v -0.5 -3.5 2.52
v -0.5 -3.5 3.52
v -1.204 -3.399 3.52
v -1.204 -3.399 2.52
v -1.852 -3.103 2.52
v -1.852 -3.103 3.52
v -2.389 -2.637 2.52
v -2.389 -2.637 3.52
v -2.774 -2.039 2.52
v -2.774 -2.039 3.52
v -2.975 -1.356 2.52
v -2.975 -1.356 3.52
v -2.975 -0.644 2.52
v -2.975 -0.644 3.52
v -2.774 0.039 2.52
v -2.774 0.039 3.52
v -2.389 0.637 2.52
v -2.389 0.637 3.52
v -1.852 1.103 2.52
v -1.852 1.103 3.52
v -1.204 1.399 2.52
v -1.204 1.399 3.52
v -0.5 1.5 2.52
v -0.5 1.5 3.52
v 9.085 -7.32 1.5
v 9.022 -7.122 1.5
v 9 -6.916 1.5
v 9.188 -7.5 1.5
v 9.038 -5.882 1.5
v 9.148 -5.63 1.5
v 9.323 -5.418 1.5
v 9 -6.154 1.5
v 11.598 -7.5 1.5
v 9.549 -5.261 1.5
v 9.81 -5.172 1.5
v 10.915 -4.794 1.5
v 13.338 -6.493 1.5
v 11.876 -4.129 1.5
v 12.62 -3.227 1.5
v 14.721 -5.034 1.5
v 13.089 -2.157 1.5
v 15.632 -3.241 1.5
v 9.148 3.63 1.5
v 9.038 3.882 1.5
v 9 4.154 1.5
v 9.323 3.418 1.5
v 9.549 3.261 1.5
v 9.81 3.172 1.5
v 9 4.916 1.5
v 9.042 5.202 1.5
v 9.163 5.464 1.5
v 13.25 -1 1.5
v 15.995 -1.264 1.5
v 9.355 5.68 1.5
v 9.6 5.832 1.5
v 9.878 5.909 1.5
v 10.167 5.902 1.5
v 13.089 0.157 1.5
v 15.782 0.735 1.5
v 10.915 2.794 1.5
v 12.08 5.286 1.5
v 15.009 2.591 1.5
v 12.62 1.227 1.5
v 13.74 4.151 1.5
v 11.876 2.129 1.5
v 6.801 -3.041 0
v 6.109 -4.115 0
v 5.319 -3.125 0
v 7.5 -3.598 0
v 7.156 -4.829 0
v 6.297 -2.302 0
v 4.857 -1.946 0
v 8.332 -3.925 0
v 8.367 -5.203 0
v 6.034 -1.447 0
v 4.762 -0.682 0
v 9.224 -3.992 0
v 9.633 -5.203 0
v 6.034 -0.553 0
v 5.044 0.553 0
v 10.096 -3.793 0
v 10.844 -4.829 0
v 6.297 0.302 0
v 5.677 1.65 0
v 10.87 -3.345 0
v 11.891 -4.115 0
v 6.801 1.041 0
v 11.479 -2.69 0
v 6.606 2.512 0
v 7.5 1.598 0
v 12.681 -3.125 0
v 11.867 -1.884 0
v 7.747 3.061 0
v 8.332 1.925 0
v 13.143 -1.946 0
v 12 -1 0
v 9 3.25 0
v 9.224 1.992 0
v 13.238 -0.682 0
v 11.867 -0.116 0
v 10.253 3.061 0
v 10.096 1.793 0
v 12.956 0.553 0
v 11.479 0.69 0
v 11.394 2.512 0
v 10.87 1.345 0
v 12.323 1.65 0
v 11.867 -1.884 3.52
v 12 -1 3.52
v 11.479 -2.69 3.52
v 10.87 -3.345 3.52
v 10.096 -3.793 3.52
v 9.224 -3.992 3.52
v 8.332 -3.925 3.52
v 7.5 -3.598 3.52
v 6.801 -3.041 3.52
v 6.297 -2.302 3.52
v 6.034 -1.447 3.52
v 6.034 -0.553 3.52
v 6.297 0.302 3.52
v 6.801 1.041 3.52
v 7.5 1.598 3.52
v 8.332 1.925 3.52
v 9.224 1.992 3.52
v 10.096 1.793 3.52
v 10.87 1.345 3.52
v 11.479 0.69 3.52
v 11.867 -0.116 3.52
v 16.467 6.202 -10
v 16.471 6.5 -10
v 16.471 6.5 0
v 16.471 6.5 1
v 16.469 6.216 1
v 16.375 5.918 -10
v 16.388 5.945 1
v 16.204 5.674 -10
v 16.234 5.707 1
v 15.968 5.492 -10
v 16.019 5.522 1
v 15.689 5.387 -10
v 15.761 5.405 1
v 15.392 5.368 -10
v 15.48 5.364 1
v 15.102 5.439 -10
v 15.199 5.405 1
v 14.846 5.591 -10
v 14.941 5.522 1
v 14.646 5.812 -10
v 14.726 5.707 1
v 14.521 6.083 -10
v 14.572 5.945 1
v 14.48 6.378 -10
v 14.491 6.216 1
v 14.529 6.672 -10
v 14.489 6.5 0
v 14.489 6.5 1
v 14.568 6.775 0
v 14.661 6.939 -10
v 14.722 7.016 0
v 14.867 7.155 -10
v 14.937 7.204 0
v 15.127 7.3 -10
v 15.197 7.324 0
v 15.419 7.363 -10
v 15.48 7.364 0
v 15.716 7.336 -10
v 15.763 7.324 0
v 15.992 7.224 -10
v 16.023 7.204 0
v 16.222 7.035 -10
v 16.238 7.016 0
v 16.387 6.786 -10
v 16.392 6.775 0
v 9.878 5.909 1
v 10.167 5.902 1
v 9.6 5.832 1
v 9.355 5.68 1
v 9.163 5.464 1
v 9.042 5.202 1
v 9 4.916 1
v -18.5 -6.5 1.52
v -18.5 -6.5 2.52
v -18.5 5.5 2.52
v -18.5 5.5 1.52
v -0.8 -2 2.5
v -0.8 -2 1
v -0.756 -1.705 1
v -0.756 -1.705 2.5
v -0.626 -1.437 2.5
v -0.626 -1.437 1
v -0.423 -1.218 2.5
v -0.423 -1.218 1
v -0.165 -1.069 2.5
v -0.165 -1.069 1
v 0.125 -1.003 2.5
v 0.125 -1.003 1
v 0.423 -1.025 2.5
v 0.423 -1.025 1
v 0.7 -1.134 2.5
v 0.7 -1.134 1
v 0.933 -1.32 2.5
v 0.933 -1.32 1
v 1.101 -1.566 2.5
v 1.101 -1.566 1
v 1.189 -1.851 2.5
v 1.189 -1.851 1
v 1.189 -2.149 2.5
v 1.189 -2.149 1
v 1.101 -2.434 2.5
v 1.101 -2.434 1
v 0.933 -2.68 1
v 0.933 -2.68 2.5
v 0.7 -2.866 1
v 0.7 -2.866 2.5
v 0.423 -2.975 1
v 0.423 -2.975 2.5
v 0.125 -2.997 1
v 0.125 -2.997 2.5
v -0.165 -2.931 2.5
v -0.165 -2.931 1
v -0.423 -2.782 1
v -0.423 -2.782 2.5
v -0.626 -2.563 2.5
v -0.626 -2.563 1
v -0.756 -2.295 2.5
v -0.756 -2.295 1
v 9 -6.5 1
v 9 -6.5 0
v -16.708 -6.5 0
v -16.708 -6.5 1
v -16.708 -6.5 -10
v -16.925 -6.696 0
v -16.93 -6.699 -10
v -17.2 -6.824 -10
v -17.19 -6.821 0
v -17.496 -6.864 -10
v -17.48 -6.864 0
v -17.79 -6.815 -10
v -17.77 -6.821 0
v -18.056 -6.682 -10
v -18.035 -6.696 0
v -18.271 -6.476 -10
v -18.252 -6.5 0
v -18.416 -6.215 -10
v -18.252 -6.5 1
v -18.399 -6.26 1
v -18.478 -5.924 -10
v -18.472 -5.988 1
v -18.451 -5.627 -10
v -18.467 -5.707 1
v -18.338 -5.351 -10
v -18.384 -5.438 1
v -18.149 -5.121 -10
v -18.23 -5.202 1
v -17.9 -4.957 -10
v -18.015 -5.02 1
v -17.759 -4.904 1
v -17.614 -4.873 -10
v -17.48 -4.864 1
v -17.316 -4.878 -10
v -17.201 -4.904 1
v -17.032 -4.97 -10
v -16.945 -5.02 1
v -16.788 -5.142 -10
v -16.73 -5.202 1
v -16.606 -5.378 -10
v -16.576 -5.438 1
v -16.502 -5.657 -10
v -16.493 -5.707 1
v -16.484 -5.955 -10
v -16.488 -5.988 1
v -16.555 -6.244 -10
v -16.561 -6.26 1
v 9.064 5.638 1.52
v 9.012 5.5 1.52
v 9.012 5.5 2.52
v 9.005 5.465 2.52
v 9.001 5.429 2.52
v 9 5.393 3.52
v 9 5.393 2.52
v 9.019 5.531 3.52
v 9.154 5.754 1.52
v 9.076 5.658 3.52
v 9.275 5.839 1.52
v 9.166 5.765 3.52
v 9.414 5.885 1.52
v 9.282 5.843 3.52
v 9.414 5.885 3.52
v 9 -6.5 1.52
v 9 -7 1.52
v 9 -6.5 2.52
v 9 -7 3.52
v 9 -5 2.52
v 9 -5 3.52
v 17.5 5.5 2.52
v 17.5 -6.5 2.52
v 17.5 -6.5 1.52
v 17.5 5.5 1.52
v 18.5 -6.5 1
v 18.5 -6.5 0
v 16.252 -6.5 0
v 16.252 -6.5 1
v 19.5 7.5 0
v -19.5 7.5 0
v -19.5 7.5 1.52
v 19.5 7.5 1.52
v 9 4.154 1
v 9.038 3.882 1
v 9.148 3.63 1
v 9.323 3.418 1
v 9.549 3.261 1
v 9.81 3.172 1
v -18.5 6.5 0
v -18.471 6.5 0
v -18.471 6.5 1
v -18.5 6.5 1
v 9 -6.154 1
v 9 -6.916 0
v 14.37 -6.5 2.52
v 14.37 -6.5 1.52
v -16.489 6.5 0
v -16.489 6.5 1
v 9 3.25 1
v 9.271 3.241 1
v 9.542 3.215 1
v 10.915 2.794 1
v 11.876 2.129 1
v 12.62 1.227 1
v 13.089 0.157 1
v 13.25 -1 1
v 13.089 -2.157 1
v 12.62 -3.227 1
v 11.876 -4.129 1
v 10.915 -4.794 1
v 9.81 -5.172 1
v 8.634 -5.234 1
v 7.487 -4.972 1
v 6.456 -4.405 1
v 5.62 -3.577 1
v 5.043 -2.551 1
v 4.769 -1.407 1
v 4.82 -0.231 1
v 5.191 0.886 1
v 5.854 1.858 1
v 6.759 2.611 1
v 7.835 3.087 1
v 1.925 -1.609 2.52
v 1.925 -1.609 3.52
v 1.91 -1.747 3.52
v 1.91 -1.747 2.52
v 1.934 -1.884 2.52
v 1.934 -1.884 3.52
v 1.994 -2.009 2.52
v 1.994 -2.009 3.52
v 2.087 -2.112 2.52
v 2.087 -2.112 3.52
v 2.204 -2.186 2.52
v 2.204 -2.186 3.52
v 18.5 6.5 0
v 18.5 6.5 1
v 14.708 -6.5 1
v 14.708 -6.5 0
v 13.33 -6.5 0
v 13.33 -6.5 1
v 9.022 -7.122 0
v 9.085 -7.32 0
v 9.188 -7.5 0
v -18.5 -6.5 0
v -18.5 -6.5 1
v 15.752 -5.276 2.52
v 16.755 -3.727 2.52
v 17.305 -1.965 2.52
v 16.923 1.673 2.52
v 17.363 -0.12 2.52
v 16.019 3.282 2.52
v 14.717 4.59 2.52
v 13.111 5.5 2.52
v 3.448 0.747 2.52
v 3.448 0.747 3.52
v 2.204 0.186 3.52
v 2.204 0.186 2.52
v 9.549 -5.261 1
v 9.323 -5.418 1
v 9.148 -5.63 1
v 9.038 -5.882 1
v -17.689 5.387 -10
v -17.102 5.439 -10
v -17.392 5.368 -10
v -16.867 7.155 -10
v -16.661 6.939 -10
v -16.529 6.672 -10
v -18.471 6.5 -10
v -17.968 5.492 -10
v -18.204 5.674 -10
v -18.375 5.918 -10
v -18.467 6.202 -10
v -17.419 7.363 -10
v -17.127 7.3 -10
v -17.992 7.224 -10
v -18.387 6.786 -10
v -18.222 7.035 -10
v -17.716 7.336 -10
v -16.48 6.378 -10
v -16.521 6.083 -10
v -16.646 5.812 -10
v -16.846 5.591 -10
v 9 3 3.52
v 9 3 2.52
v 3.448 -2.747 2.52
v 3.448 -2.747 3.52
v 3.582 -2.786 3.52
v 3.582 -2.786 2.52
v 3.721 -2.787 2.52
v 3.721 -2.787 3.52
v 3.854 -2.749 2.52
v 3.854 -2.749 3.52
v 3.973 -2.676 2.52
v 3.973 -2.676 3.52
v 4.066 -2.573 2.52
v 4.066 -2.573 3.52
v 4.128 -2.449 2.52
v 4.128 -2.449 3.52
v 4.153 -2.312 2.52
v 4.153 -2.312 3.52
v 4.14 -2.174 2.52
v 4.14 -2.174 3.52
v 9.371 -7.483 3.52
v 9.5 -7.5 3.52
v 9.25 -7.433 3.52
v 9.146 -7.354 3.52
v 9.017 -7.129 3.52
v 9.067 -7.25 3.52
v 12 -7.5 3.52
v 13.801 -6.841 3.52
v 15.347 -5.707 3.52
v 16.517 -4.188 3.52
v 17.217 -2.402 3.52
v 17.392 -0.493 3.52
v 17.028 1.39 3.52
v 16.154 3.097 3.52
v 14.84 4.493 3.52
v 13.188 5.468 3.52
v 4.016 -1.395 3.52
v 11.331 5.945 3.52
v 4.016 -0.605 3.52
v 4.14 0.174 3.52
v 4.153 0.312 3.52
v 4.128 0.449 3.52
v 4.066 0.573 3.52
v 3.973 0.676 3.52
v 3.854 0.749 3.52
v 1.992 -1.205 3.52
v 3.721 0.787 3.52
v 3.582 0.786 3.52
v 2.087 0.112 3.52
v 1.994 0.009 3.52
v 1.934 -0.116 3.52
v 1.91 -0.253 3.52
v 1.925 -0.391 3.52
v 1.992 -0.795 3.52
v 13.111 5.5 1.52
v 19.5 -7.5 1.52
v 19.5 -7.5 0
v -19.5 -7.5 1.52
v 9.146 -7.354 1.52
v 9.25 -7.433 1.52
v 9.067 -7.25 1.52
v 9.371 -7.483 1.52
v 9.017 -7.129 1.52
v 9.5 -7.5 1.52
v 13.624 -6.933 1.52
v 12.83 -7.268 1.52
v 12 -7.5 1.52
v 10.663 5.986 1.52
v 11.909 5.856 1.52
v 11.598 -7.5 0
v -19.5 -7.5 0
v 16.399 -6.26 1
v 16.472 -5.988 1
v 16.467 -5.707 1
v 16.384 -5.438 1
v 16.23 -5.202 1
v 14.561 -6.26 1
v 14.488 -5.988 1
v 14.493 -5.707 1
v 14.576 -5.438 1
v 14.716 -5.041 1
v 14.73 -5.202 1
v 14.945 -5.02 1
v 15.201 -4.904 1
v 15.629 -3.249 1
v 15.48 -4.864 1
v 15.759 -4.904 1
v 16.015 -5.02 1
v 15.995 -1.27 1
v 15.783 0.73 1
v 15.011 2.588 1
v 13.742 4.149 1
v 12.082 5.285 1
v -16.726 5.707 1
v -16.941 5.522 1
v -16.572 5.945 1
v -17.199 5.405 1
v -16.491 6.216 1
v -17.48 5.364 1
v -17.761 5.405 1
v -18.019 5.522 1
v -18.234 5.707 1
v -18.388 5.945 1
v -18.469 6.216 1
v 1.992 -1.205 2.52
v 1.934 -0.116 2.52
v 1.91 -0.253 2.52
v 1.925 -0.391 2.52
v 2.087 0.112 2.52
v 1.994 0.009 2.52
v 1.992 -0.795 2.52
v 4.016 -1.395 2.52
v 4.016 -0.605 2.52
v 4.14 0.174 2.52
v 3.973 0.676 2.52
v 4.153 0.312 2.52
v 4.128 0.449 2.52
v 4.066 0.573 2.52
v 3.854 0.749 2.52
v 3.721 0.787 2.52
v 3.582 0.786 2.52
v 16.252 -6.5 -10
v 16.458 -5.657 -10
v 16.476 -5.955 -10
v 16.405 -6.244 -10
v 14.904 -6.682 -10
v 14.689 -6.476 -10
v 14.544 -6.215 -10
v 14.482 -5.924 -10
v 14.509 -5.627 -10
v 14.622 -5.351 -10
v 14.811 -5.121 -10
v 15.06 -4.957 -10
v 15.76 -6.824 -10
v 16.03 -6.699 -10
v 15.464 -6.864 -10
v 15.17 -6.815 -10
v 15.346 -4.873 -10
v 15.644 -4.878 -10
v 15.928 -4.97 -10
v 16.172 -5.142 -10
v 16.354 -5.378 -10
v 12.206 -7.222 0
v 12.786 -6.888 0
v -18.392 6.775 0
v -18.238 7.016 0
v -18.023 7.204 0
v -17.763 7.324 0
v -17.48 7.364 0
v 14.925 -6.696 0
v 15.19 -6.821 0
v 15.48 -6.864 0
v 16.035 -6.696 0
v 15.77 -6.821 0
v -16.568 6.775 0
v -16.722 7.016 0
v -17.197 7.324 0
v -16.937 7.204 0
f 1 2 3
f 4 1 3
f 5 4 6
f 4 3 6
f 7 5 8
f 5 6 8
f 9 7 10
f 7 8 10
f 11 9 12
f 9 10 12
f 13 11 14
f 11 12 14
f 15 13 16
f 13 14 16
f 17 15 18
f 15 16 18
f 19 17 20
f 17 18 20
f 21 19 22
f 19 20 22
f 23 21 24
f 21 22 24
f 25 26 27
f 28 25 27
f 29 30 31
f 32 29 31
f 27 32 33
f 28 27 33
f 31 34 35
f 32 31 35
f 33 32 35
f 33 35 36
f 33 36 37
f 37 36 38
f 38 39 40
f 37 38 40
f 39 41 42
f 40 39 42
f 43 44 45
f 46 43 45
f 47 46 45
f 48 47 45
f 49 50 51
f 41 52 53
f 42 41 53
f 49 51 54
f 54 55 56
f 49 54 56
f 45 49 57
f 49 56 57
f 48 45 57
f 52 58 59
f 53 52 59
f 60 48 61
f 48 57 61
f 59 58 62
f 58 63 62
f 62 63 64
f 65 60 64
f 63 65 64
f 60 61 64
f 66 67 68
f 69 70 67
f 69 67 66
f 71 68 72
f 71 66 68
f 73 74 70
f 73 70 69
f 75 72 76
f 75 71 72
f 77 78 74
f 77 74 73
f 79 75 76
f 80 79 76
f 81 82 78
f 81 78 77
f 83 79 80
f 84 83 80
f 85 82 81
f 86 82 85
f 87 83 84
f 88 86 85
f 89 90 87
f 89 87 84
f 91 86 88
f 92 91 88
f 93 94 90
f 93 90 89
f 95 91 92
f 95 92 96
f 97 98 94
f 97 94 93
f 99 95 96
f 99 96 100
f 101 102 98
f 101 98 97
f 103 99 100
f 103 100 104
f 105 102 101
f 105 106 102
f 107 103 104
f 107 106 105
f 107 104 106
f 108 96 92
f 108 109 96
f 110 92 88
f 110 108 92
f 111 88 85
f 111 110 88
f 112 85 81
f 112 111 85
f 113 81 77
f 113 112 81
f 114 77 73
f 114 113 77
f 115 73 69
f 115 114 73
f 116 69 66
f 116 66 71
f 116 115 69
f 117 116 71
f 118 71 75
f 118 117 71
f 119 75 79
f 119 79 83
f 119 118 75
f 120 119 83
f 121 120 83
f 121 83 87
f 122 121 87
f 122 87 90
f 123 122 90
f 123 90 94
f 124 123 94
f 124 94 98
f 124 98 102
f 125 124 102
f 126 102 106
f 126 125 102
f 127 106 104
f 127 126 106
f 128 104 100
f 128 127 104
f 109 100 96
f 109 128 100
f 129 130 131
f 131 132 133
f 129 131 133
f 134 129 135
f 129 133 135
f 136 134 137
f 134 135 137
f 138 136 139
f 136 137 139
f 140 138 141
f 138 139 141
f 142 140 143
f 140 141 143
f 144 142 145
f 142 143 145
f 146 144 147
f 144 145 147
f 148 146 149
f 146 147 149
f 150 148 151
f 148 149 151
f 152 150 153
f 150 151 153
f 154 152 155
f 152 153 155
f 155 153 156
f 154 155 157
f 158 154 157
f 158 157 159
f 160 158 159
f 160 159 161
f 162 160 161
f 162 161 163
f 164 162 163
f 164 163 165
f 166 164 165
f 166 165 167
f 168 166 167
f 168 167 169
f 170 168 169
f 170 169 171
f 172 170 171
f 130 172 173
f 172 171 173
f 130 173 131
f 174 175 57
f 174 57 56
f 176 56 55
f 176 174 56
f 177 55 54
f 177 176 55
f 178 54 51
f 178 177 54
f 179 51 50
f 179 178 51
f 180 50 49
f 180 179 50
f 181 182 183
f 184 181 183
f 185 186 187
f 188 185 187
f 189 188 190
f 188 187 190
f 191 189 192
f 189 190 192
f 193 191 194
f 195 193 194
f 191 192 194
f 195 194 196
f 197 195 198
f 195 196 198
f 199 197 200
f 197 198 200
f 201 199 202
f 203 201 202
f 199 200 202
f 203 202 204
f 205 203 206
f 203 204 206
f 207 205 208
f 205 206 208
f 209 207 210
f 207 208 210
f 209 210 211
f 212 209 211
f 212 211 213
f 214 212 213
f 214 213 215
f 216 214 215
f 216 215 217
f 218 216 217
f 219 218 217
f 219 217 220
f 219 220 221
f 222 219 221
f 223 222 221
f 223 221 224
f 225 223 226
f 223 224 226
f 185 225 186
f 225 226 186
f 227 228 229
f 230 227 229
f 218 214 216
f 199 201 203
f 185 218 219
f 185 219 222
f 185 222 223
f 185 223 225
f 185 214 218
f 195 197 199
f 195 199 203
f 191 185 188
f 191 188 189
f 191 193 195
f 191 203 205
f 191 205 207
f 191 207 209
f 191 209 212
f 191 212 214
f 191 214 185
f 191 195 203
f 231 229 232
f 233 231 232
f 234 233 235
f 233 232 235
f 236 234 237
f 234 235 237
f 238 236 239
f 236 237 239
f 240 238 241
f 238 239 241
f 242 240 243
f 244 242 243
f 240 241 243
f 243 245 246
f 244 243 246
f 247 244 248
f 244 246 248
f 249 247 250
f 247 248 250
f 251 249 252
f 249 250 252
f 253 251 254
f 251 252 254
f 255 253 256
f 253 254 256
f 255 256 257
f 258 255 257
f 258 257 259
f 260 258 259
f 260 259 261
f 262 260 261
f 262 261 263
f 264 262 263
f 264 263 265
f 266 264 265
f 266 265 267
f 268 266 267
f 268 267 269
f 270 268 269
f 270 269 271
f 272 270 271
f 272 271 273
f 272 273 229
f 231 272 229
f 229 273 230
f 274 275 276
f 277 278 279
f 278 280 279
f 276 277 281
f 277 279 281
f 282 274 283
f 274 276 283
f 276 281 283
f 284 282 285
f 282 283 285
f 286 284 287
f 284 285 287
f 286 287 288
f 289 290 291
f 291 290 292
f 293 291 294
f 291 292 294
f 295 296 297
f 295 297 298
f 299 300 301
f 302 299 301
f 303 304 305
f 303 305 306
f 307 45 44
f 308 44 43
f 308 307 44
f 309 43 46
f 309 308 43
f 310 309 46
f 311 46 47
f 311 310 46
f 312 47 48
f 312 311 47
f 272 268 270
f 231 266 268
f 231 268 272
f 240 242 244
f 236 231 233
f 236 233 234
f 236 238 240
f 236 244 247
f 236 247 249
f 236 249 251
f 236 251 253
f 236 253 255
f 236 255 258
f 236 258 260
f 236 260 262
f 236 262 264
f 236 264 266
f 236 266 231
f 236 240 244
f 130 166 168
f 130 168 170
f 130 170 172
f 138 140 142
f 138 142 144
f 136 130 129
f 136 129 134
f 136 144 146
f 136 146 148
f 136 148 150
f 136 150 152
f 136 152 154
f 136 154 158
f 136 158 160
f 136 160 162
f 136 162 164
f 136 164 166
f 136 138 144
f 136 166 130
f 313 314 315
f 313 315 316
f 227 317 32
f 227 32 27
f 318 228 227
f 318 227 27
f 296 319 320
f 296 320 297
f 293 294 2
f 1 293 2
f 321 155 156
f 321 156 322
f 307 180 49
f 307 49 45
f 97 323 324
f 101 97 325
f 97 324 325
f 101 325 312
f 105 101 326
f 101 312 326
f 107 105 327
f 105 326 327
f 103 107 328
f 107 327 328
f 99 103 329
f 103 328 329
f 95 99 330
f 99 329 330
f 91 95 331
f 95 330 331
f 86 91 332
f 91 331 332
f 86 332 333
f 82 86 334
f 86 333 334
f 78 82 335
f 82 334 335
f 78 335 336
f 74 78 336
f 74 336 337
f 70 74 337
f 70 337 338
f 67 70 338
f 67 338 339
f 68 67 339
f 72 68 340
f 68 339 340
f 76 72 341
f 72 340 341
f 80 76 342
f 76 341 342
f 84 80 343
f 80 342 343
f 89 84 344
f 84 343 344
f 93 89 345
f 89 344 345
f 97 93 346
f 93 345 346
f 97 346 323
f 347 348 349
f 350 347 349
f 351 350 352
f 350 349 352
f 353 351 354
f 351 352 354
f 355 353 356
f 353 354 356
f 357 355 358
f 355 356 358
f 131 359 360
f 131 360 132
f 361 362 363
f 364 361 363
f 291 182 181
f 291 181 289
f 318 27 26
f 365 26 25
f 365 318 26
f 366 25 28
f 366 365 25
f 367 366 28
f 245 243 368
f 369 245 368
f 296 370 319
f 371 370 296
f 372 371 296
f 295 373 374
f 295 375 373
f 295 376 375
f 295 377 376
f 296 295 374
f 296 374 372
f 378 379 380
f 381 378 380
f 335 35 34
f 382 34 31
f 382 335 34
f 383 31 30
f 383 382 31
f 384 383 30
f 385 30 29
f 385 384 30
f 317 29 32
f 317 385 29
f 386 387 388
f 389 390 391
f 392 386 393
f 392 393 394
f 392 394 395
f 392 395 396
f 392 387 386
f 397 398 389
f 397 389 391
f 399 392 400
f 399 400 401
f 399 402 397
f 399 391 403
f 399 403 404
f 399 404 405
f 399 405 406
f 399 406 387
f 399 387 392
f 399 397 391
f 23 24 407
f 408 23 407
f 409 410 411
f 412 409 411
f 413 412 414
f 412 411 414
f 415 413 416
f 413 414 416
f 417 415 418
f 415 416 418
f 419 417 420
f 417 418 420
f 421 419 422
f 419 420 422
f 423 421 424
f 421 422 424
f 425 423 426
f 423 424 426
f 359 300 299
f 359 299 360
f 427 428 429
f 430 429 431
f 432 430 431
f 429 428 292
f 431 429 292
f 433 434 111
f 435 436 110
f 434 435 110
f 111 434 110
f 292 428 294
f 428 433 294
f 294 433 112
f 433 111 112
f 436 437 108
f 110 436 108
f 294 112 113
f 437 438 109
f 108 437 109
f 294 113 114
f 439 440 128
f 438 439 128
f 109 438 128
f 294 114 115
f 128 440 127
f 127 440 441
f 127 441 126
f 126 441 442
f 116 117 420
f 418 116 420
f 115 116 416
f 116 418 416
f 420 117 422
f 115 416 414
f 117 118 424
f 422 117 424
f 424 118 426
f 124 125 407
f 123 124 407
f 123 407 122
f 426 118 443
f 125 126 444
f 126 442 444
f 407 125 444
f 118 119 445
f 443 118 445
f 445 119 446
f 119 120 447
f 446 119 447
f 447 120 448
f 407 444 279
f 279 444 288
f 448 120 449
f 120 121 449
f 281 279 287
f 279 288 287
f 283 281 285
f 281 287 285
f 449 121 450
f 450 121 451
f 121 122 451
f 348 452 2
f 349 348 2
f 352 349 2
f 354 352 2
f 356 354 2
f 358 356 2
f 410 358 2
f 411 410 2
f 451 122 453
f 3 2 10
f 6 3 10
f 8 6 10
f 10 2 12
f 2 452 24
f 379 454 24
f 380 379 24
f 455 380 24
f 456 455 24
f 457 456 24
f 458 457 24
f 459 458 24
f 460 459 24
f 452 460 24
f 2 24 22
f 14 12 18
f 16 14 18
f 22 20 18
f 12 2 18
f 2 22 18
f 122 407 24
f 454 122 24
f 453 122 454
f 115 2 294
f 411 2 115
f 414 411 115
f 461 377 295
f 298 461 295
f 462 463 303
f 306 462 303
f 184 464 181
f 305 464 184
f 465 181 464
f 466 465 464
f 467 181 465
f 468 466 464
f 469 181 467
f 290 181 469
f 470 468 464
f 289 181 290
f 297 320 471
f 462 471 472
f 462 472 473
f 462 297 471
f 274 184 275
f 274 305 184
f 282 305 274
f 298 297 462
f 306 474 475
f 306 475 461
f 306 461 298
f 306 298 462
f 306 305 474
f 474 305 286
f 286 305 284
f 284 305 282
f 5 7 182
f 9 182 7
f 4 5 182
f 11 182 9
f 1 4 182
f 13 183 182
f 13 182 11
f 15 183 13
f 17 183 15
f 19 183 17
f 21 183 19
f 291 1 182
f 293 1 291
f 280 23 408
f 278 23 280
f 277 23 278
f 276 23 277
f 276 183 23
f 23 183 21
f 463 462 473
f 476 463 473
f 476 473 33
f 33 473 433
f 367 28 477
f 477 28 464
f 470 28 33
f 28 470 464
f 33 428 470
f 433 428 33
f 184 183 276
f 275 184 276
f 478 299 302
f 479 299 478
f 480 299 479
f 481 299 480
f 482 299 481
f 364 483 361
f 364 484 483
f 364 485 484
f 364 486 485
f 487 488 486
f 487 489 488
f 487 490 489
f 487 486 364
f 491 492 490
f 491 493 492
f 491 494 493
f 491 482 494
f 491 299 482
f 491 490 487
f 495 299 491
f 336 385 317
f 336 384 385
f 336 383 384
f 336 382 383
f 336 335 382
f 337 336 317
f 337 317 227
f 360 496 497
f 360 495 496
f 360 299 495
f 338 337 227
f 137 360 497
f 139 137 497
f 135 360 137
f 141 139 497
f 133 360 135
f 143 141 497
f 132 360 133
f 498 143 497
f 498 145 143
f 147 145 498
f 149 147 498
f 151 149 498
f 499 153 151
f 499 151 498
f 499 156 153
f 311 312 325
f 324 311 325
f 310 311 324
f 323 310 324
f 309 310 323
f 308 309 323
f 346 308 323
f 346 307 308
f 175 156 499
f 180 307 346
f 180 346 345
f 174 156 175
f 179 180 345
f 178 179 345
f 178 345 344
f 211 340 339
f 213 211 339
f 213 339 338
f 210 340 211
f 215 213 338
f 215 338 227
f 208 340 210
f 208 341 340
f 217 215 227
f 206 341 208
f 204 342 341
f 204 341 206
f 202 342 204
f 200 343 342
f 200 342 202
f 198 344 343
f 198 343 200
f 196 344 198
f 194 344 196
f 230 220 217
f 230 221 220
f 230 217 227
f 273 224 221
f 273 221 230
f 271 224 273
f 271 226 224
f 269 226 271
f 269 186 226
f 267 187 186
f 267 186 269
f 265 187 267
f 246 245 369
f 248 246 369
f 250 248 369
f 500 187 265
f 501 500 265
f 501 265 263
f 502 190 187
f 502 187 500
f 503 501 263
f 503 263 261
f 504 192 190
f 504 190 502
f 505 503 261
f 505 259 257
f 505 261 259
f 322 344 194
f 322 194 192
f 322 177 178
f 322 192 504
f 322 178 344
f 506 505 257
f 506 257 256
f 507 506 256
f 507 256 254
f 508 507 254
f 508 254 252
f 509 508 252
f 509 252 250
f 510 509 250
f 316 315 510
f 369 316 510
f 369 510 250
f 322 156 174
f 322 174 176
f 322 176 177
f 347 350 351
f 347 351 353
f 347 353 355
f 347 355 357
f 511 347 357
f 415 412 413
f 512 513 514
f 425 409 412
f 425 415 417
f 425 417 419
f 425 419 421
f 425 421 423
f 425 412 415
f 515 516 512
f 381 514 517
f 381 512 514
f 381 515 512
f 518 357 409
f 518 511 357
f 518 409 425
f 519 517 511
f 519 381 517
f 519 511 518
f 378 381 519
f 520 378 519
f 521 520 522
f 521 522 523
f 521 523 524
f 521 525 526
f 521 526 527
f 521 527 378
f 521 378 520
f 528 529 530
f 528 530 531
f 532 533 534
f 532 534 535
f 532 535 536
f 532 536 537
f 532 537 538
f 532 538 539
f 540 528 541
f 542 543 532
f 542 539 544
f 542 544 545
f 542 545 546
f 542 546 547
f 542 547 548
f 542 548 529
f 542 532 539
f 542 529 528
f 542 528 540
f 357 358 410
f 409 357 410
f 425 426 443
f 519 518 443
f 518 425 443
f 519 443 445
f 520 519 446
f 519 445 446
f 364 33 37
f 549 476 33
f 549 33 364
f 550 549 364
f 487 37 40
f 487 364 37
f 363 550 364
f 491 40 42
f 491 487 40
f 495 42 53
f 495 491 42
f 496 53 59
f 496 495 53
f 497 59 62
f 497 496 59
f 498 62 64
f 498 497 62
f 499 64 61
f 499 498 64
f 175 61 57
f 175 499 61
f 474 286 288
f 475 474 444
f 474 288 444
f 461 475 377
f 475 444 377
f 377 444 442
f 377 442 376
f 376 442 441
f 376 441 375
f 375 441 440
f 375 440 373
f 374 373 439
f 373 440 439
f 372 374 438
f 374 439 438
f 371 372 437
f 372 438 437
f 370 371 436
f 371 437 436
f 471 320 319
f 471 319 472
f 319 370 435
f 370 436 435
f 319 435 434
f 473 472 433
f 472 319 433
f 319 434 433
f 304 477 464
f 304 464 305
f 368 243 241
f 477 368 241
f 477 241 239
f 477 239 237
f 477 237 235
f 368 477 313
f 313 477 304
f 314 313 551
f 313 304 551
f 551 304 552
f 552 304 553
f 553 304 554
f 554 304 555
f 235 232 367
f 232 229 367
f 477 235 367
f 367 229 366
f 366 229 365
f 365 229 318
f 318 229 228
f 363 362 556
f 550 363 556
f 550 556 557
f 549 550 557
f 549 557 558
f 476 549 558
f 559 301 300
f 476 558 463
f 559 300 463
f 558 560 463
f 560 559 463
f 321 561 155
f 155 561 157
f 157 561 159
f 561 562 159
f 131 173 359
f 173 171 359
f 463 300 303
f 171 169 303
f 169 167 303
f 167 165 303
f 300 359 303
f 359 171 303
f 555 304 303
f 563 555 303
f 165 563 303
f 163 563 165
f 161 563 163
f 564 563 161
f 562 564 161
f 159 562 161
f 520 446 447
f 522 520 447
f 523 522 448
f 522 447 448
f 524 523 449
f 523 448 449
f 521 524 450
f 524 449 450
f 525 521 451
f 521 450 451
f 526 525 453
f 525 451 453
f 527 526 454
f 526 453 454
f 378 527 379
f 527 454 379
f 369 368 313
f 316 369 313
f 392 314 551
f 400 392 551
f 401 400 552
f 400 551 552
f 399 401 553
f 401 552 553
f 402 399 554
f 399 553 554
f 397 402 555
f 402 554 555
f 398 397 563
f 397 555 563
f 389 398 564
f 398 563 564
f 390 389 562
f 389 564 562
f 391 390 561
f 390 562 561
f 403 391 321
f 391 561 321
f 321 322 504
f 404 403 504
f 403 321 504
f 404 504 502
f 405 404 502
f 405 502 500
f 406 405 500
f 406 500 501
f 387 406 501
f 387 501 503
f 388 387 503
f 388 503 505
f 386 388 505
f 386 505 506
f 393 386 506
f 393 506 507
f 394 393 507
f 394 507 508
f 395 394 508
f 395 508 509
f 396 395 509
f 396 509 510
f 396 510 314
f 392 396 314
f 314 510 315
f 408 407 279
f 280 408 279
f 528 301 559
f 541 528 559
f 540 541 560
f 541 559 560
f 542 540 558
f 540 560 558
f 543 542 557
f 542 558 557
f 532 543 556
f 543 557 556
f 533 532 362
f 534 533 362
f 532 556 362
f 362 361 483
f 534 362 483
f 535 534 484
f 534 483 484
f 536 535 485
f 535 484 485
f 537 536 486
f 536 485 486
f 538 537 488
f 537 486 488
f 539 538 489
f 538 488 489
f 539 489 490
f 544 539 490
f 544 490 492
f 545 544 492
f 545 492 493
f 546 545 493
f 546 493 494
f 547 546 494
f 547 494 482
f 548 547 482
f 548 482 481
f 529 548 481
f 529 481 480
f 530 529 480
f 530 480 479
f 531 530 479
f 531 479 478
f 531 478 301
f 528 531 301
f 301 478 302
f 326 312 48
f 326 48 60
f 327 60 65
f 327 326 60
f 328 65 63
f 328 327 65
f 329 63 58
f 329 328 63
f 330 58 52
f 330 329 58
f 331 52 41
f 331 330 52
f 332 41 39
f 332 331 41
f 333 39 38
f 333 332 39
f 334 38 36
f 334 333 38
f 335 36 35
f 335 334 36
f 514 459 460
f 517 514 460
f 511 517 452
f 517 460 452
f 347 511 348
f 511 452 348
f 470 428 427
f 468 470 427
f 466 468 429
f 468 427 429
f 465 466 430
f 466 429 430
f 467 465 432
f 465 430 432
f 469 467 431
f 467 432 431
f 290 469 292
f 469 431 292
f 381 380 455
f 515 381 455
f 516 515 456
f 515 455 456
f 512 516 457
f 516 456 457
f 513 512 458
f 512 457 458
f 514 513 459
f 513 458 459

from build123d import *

# Parameters (mm, degrees)
SCHIZZO1_W                   = 39
SCHIZZO1_H                   = 15
ESTRUSIONE_ESTRUSIONE1_DEPTH = 2.52
SCHIZZO2_W                   = 39
SCHIZZO2_H                   = 15
SCHIZZO2_W_2                 = 36
SCHIZZO2_H_2                 = 12
TAGLIO_ESTRUSIONE1_DEPTH     = 1
TAGLIO_ESTRUSIONE2_REACH     = 23.044
SCHIZZO3_R                   = 3
ESTRUSIONE_ESTRUSIONE2_START = 1
SCHIZZO4_R                   = 3
ESTRUSIONE_ESTRUSIONE2_DEPTH = 2
SCHIZZO5_W                   = 37
SCHIZZO5_H                   = 13
TAGLIO_ESTRUSIONE4_DEPTH     = 1
TAGLIO_ESTRUSIONE9_DEPTH     = 1.5
ESTRUSIONE_ESTRUSIONE3_START = -1
SCHIZZO11_R                  = 1
ESTRUSIONE_ESTRUSIONE3_DEPTH = 11
SCHIZZO12_R                  = 1
TAGLIO_ESTRUSIONE10_DEPTH    = 1.5
SCHIZZO13_R                  = 4.25
SCHIZZO13_R_2                = 3
ESTRUSIONE_ESTRUSIONE4_DEPTH = 1


with BuildPart() as part:
    # Schizzo1 → Estrusione-Estrusione1 (new body)
    with BuildSketch(Plane.XY):
        Rectangle(SCHIZZO1_W, SCHIZZO1_H)
    extrude(amount=ESTRUSIONE_ESTRUSIONE1_DEPTH)

    # Schizzo2 → Taglio-Estrusione1 (cut)
    with BuildSketch(Plane.XY.offset(2.52)):
        Rectangle(SCHIZZO2_W, SCHIZZO2_H)
        with Locations((-0.5, -0.5)):
            Rectangle(SCHIZZO2_W_2, SCHIZZO2_H_2, mode=Mode.SUBTRACT)
    extrude(amount=-TAGLIO_ESTRUSIONE1_DEPTH, mode=Mode.SUBTRACT)

    # Schizzo3 → Taglio-Estrusione2 (cut, up to next)
    with BuildSketch(Plane.XY.offset(2.52), mode=Mode.PRIVATE) as taglio_estrusione2_sk1:
        with Locations((9, -1)):
            Circle(SCHIZZO3_R)
    taglio_estrusione2_tool1 = extrude(taglio_estrusione2_sk1.sketch, amount=-TAGLIO_ESTRUSIONE2_REACH, mode=Mode.PRIVATE) & part.part
    add(taglio_estrusione2_tool1.solids().sort_by_distance((9, -1, 2.52))[0], mode=Mode.SUBTRACT)

    # Schizzo4 → Estrusione-Estrusione2 (add)
    with BuildSketch(Plane.XY.offset(2.52).offset(ESTRUSIONE_ESTRUSIONE2_START)):
        with BuildLine():
            Line((-0.5, 1.5), (9, 3))
            Line((9, 3), (9, 5.392769143))
            ThreePointArc((9, 5.392769143), (9.117356016, 5.714613176), (9.414334326, 5.885375875))
            ThreePointArc((9.414334326, 5.885375875), (17.276253266, 0.461644492), (12, -7.5))
            Line((12, -7.5), (9.5, -7.5))
            ThreePointArc((9.5, -7.5), (9.146446609, -7.353553391), (9, -7))
            Line((9, -7), (9, -5))
            Line((9, -5), (-0.5, -3.5))
            ThreePointArc((-0.5, -3.5), (-3, -1), (-0.5, 1.5))
        make_face()
        with Locations((9, -1)):
            Circle(SCHIZZO4_R, mode=Mode.SUBTRACT)
        with BuildLine():
            Line((3.448203243, 0.746895178), (2.204268804, 0.186161276))
            ThreePointArc((2.204268804, 0.186161276), (1.959671645, -0.051873187), (1.924787234, -0.391389392))
            ThreePointArc((1.924787234, -0.391389392), (2, -1), (1.924787234, -1.608610608))
            ThreePointArc((1.924787234, -1.608610608), (1.959671645, -1.948126813), (2.204268804, -2.186161276))
            Line((2.204268804, -2.186161276), (3.448203243, -2.746895178))
            ThreePointArc((3.448203243, -2.746895178), (3.972766245, -2.67601261), (4.139708291, -2.173696937))
            ThreePointArc((4.139708291, -2.173696937), (4, -1), (4.139708291, 0.173696937))
            ThreePointArc((4.139708291, 0.173696937), (3.972766245, 0.67601261), (3.448203243, 0.746895178))
        make_face(mode=Mode.SUBTRACT)
    extrude(amount=-ESTRUSIONE_ESTRUSIONE2_DEPTH)

    # Schizzo5 → Taglio-Estrusione4 (cut)
    with BuildSketch(Plane(origin=(0, 0, 0), x_dir=(-1, 0, 0), z_dir=(0, 0, -1))):
        Rectangle(SCHIZZO5_W, SCHIZZO5_H)
    extrude(amount=-TAGLIO_ESTRUSIONE4_DEPTH, mode=Mode.SUBTRACT)

    # Schizzo6 → Taglio-Estrusione9 (cut)
    with BuildSketch(Plane(origin=(0, 0, 0), x_dir=(-1, 0, 0), z_dir=(0, 0, -1))):
        with BuildLine():
            Line((-9, 4.916079783), (-9, 4.153882032))
            ThreePointArc((-9, 4.153882032), (-9.22848325, 3.517673022), (-9.80952381, 3.172190216))
            ThreePointArc((-9.80952381, 3.172190216), (-13.25, -1), (-9.80952381, -5.172190216))
            ThreePointArc((-9.80952381, -5.172190216), (-9.22848325, -5.517673022), (-9, -6.153882032))
            Line((-9, -6.153882032), (-9, -6.916079783))
            ThreePointArc((-9, -6.916079783), (-9.354502776, -7.679842399), (-10.166666667, -7.90209308))
            ThreePointArc((-10.166666667, -7.90209308), (-16, -1), (-10.166666667, 5.90209308))
            ThreePointArc((-10.166666667, 5.90209308), (-9.354502776, 5.679842399), (-9, 4.916079783))
        make_face()
    extrude(amount=-TAGLIO_ESTRUSIONE9_DEPTH, mode=Mode.SUBTRACT)

    # Schizzo11 → Estrusione-Estrusione3 (add)
    with BuildSketch(Plane(origin=(0, 0, 0), x_dir=(-1, 0, 0), z_dir=(0, 0, -1)).offset(ESTRUSIONE_ESTRUSIONE3_START)):
        with Locations(Location((-15.48, -5.864394435, 0), (0, 0, 219.464912598))):
            Circle(SCHIZZO11_R)
        with Locations(Location((-15.48, 6.364394435, 0), (0, 0, 172.206361755))):
            Circle(SCHIZZO11_R)
        with Locations(Location((17.48, 6.364394435, 0), (0, 0, 7.793638245))):
            Circle(SCHIZZO11_R)
        with Locations(Location((17.48, -5.864394435, 0), (0, 0, 219.464912598))):
            Circle(SCHIZZO11_R)
    extrude(amount=ESTRUSIONE_ESTRUSIONE3_DEPTH)

    # Schizzo12 → Taglio-Estrusione10 (cut)
    with BuildSketch(Plane(origin=(0, 0, 1), x_dir=(-1, 0, 0), z_dir=(0, 0, -1))):
        with Locations((-0.2, -2)):
            Circle(SCHIZZO12_R)
    extrude(amount=-TAGLIO_ESTRUSIONE10_DEPTH, mode=Mode.SUBTRACT)

    # Schizzo13 → Estrusione-Estrusione4 (add)
    with BuildSketch(Plane(origin=(0, 0, 1), x_dir=(-1, 0, 0), z_dir=(0, 0, -1))):
        with Locations(Location((-9, -1, 0), (0, 0, 90))):
            Circle(SCHIZZO13_R)
        with Locations(Location((-9, -1, 0), (0, 0, 180))):
            Circle(SCHIZZO13_R_2, mode=Mode.SUBTRACT)
    extrude(amount=ESTRUSIONE_ESTRUSIONE4_DEPTH)


solid = part.part
